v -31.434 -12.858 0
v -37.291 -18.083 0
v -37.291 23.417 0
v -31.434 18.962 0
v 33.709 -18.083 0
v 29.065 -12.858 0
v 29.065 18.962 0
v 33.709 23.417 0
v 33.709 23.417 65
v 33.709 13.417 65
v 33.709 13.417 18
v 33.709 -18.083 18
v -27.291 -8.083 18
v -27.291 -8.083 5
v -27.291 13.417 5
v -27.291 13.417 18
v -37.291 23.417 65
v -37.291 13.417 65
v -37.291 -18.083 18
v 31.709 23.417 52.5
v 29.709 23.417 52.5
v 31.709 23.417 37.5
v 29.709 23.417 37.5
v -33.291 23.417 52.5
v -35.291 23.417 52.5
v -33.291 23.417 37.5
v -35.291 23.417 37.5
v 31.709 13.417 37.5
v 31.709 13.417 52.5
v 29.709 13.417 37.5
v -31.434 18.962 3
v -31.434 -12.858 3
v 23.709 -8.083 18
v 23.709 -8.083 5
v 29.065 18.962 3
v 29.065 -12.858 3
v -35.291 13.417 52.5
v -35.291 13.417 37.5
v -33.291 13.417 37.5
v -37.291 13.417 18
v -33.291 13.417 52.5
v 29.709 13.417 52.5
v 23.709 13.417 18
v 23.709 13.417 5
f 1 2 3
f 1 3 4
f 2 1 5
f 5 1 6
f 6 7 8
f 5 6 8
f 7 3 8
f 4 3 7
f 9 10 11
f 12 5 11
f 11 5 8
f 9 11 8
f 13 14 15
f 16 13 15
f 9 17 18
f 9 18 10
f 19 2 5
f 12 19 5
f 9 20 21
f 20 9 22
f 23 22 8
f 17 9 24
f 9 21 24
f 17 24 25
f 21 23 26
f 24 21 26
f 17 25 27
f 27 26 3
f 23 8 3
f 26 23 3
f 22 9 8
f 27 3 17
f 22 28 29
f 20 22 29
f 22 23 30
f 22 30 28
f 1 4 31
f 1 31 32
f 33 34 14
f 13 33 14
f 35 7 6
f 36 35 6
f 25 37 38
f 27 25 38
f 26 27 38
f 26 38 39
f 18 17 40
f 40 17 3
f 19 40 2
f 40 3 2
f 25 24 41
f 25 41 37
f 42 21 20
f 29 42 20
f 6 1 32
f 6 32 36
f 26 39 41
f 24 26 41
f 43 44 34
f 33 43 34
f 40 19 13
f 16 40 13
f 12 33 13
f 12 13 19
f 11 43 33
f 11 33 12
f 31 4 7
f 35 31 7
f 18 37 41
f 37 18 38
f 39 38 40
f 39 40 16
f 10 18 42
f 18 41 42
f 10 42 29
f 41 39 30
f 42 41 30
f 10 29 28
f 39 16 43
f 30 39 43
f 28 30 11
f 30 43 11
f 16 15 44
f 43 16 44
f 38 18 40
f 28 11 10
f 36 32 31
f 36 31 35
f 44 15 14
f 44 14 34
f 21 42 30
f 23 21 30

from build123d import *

# Parameters (mm, degrees)
F1_DEPTH = 18
F0_W     = 51
F0_H     = 21.5
F2_DEPTH = 5
F4_DEPTH = 47
F5_W     = 2
F5_H     = 12.5
F5_H_2   = 2.5
F6_DEPTH = 10
F7_W     = 60.499498
F7_H     = 31.819807
F8_DEPTH = 3


with BuildPart() as f1:
    # F0 (on Top) → F1 (new body)
    with BuildSketch(Plane.XY):
        Polygon((-37.291151, 13.41747), (-27.291151, 13.41747), (23.708849, 13.41747), (33.708849, 13.41747), (33.708849, 23.41747), (23.708849, 23.41747), (-27.291151, 23.41747), (-37.291151, 23.41747), align=None)
        Polygon((-27.291151, -8.08253), (-27.291151, 13.41747), (-37.291151, 13.41747), (-37.291151, -8.08253), (-37.291151, -18.08253), (-27.291151, -18.08253), (23.708849, -18.08253), (33.708849, -18.08253), (33.708849, -8.08253), (33.708849, 13.41747), (23.708849, 13.41747), (23.708849, -8.08253), align=None)
    extrude(amount=F1_DEPTH)

    # F0 (on Top) → F2 (join)
    with BuildSketch(Plane.XY):
        with Locations((-1.791151, 2.66747)):
            Rectangle(F0_W, F0_H)
    extrude(amount=F2_DEPTH)

    # F3 (on face) → F4 (join)
    with BuildSketch(Plane.XY.offset(18)):
        Polygon((33.708849, 23.41747), (-37.291151, 23.41747), (-37.291151, 13.41747), (-27.291151, 13.41747), (23.708849, 13.41747), (33.708849, 13.41747), align=None)
    extrude(amount=F4_DEPTH)

    # F5 (on face) → F6 (cut)
    with BuildSketch(Plane.XZ.offset(-13.41747)):
        Polygon((-33.291151, 37.5), (-33.291151, 50), (-33.291151, 52.5), (-35.291151, 52.5), (-35.291151, 37.5), align=None)
        with Locations((30.708849, 43.75)):
            Rectangle(F5_W, F5_H)
        with Locations((30.708849, 51.25)):
            Rectangle(F5_W, F5_H_2)
    extrude(amount=-F6_DEPTH, mode=Mode.SUBTRACT)

    # F7 (on face) → F8 (cut)
    with BuildSketch(Plane(origin=(0, 0, 0), x_dir=(1, 0, 0), z_dir=(0, 0, -1))):
        with Locations((-1.184429, -3.051597)):
            Rectangle(F7_W, F7_H)
    extrude(amount=-F8_DEPTH, mode=Mode.SUBTRACT)


solid = f1.part
